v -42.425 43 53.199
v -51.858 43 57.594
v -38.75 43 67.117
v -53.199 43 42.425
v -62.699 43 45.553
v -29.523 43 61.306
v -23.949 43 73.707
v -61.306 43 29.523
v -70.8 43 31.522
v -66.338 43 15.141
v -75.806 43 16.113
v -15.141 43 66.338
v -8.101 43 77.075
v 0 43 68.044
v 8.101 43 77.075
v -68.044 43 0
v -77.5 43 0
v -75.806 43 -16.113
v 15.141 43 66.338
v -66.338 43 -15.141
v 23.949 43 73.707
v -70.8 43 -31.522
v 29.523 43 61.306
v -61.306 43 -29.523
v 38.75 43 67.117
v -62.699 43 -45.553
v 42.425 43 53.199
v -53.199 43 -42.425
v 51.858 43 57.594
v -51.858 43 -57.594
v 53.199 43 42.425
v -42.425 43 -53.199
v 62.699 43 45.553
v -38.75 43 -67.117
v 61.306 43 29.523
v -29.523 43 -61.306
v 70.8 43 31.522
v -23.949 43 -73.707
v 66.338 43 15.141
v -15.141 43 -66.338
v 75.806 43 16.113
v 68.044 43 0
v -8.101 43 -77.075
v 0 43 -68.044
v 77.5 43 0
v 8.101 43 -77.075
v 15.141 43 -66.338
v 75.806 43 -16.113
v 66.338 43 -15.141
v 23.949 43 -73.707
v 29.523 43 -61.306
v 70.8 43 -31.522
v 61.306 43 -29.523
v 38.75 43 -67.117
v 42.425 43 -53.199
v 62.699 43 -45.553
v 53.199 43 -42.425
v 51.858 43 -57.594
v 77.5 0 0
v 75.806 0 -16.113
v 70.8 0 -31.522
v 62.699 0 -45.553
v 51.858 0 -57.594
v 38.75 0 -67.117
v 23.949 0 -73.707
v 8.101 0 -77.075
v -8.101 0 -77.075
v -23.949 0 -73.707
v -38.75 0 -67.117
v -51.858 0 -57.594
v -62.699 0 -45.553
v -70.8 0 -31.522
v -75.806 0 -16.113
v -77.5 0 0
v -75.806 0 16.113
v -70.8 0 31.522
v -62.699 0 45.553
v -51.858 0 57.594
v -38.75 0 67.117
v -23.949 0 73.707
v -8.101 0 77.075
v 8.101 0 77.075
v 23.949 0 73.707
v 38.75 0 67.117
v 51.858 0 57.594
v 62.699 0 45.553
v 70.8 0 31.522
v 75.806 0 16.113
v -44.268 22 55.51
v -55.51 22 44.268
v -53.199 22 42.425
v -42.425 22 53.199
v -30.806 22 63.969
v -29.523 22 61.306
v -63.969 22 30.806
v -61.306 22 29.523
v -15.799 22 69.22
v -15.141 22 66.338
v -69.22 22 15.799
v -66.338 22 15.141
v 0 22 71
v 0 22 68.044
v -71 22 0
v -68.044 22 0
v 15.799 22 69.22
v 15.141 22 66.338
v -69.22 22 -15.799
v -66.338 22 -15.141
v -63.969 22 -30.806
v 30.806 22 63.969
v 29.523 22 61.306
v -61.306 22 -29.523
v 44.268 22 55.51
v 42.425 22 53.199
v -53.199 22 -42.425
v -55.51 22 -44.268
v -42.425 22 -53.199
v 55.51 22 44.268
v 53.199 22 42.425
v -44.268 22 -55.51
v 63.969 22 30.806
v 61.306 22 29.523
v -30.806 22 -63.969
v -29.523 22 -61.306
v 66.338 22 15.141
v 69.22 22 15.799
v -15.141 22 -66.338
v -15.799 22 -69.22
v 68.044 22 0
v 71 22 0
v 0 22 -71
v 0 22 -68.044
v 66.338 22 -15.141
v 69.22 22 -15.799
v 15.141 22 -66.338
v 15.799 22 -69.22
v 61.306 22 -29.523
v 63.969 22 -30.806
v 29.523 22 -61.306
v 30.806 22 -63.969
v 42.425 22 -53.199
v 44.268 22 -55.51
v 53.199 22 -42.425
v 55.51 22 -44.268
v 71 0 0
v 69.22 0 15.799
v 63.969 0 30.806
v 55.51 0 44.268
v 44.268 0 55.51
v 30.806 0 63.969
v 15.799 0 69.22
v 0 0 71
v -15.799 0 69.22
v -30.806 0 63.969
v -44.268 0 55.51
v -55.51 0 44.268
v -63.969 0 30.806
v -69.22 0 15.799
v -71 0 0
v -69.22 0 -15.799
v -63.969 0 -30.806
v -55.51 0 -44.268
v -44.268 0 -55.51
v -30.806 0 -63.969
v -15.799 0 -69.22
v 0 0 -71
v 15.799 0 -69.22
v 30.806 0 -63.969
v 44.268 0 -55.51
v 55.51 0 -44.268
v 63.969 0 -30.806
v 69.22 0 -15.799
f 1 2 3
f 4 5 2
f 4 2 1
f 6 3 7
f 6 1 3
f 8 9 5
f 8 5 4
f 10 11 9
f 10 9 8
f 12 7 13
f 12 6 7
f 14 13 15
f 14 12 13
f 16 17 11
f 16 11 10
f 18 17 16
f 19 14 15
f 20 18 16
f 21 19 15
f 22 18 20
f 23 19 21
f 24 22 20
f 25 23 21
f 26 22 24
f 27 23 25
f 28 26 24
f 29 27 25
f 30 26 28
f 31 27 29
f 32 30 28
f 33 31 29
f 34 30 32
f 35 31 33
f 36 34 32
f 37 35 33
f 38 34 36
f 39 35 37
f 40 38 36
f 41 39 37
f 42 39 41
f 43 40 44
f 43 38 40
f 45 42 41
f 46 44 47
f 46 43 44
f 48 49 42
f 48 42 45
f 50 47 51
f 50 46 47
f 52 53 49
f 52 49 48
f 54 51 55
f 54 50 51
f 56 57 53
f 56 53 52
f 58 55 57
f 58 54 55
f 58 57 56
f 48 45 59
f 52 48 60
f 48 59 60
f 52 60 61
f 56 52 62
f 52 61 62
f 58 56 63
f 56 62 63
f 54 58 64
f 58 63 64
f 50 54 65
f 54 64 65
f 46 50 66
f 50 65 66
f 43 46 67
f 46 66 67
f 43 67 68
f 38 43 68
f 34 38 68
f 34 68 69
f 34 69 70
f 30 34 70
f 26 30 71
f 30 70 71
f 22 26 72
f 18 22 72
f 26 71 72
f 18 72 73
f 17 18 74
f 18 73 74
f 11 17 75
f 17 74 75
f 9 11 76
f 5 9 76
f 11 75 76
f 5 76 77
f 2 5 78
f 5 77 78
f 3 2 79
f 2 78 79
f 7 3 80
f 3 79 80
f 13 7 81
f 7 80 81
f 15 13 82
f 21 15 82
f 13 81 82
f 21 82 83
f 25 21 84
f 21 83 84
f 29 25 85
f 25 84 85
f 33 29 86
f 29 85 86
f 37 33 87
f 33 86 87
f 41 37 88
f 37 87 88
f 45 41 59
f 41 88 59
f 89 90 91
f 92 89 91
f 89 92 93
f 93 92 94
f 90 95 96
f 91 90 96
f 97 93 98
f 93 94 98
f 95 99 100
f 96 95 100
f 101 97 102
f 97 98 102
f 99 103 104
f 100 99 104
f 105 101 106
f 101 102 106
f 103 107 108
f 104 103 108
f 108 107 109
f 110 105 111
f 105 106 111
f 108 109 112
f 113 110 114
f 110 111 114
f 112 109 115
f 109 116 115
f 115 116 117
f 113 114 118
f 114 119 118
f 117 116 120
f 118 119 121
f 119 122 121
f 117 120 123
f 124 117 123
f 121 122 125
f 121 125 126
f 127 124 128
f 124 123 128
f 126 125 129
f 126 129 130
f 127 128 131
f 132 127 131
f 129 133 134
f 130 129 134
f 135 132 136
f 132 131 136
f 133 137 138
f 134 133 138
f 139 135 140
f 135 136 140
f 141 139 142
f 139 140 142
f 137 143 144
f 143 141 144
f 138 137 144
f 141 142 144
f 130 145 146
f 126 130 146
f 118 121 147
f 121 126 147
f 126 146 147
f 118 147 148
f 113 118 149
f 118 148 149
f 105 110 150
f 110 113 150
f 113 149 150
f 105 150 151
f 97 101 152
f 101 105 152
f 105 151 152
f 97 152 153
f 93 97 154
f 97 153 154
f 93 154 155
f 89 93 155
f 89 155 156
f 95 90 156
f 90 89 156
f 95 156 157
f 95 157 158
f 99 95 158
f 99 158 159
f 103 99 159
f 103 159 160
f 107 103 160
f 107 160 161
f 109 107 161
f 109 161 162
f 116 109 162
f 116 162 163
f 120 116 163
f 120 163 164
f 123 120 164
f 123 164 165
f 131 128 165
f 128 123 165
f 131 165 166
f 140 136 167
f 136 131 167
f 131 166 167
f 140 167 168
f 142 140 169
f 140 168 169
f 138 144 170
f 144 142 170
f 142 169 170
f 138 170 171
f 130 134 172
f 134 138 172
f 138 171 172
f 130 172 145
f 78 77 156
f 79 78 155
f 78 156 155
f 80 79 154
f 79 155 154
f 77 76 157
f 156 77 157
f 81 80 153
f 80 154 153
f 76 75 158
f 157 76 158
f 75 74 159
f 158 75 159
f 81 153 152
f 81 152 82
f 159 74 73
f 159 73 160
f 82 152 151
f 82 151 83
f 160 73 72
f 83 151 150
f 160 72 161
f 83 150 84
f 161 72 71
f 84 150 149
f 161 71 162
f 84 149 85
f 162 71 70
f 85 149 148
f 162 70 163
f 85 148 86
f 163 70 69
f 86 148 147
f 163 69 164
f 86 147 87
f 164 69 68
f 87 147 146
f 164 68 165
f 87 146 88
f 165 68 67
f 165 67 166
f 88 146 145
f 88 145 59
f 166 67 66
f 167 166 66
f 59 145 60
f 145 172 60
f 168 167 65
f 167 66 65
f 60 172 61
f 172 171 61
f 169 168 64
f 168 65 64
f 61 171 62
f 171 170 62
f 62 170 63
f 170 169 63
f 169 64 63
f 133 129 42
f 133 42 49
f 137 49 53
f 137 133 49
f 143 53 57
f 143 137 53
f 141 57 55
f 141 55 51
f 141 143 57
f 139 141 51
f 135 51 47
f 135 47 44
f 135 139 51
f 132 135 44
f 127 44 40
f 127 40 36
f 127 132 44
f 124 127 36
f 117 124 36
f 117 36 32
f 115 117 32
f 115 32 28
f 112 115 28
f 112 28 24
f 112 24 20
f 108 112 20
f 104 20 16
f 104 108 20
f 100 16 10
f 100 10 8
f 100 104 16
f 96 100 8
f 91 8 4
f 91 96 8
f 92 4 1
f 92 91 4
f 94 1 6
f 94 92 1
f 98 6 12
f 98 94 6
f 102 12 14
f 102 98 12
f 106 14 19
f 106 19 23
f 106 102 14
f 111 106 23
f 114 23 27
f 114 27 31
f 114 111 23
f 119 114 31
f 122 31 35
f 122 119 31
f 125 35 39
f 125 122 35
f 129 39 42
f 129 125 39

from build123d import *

# Parameters (mm, degrees)
SKETCH1_R           = 77.5
BOSS_EXTRUDE1_DEPTH = 43
SKETCH3_R           = 71
CUT_EXTRUDE1_DEPTH  = 44
SKETCH4_R           = 71
SKETCH4_R_2         = 68.044293834
BOSS_EXTRUDE3_DEPTH = 21


with BuildPart() as part:
    # Sketch1 → Boss-Extrude1 (new body)
    with BuildSketch(Plane(origin=(0, 0, 0), x_dir=(1, 0, 0), z_dir=(0, 1, 0))):
        Circle(SKETCH1_R)
    extrude(amount=BOSS_EXTRUDE1_DEPTH)

    # Sketch3 → Cut-Extrude1 (cut, through all)
    with BuildSketch(Plane.XZ):
        Circle(SKETCH3_R)
    extrude(amount=-CUT_EXTRUDE1_DEPTH, mode=Mode.SUBTRACT)

    # Sketch4 → Boss-Extrude3 (add, through all)
    with BuildSketch(Plane(origin=(0, 22, 0), x_dir=(1, 0, 0), z_dir=(0, 1, 0))):
        Circle(SKETCH4_R)
        Circle(SKETCH4_R_2, mode=Mode.SUBTRACT)
    extrude(amount=BOSS_EXTRUDE3_DEPTH)


solid = part.part
